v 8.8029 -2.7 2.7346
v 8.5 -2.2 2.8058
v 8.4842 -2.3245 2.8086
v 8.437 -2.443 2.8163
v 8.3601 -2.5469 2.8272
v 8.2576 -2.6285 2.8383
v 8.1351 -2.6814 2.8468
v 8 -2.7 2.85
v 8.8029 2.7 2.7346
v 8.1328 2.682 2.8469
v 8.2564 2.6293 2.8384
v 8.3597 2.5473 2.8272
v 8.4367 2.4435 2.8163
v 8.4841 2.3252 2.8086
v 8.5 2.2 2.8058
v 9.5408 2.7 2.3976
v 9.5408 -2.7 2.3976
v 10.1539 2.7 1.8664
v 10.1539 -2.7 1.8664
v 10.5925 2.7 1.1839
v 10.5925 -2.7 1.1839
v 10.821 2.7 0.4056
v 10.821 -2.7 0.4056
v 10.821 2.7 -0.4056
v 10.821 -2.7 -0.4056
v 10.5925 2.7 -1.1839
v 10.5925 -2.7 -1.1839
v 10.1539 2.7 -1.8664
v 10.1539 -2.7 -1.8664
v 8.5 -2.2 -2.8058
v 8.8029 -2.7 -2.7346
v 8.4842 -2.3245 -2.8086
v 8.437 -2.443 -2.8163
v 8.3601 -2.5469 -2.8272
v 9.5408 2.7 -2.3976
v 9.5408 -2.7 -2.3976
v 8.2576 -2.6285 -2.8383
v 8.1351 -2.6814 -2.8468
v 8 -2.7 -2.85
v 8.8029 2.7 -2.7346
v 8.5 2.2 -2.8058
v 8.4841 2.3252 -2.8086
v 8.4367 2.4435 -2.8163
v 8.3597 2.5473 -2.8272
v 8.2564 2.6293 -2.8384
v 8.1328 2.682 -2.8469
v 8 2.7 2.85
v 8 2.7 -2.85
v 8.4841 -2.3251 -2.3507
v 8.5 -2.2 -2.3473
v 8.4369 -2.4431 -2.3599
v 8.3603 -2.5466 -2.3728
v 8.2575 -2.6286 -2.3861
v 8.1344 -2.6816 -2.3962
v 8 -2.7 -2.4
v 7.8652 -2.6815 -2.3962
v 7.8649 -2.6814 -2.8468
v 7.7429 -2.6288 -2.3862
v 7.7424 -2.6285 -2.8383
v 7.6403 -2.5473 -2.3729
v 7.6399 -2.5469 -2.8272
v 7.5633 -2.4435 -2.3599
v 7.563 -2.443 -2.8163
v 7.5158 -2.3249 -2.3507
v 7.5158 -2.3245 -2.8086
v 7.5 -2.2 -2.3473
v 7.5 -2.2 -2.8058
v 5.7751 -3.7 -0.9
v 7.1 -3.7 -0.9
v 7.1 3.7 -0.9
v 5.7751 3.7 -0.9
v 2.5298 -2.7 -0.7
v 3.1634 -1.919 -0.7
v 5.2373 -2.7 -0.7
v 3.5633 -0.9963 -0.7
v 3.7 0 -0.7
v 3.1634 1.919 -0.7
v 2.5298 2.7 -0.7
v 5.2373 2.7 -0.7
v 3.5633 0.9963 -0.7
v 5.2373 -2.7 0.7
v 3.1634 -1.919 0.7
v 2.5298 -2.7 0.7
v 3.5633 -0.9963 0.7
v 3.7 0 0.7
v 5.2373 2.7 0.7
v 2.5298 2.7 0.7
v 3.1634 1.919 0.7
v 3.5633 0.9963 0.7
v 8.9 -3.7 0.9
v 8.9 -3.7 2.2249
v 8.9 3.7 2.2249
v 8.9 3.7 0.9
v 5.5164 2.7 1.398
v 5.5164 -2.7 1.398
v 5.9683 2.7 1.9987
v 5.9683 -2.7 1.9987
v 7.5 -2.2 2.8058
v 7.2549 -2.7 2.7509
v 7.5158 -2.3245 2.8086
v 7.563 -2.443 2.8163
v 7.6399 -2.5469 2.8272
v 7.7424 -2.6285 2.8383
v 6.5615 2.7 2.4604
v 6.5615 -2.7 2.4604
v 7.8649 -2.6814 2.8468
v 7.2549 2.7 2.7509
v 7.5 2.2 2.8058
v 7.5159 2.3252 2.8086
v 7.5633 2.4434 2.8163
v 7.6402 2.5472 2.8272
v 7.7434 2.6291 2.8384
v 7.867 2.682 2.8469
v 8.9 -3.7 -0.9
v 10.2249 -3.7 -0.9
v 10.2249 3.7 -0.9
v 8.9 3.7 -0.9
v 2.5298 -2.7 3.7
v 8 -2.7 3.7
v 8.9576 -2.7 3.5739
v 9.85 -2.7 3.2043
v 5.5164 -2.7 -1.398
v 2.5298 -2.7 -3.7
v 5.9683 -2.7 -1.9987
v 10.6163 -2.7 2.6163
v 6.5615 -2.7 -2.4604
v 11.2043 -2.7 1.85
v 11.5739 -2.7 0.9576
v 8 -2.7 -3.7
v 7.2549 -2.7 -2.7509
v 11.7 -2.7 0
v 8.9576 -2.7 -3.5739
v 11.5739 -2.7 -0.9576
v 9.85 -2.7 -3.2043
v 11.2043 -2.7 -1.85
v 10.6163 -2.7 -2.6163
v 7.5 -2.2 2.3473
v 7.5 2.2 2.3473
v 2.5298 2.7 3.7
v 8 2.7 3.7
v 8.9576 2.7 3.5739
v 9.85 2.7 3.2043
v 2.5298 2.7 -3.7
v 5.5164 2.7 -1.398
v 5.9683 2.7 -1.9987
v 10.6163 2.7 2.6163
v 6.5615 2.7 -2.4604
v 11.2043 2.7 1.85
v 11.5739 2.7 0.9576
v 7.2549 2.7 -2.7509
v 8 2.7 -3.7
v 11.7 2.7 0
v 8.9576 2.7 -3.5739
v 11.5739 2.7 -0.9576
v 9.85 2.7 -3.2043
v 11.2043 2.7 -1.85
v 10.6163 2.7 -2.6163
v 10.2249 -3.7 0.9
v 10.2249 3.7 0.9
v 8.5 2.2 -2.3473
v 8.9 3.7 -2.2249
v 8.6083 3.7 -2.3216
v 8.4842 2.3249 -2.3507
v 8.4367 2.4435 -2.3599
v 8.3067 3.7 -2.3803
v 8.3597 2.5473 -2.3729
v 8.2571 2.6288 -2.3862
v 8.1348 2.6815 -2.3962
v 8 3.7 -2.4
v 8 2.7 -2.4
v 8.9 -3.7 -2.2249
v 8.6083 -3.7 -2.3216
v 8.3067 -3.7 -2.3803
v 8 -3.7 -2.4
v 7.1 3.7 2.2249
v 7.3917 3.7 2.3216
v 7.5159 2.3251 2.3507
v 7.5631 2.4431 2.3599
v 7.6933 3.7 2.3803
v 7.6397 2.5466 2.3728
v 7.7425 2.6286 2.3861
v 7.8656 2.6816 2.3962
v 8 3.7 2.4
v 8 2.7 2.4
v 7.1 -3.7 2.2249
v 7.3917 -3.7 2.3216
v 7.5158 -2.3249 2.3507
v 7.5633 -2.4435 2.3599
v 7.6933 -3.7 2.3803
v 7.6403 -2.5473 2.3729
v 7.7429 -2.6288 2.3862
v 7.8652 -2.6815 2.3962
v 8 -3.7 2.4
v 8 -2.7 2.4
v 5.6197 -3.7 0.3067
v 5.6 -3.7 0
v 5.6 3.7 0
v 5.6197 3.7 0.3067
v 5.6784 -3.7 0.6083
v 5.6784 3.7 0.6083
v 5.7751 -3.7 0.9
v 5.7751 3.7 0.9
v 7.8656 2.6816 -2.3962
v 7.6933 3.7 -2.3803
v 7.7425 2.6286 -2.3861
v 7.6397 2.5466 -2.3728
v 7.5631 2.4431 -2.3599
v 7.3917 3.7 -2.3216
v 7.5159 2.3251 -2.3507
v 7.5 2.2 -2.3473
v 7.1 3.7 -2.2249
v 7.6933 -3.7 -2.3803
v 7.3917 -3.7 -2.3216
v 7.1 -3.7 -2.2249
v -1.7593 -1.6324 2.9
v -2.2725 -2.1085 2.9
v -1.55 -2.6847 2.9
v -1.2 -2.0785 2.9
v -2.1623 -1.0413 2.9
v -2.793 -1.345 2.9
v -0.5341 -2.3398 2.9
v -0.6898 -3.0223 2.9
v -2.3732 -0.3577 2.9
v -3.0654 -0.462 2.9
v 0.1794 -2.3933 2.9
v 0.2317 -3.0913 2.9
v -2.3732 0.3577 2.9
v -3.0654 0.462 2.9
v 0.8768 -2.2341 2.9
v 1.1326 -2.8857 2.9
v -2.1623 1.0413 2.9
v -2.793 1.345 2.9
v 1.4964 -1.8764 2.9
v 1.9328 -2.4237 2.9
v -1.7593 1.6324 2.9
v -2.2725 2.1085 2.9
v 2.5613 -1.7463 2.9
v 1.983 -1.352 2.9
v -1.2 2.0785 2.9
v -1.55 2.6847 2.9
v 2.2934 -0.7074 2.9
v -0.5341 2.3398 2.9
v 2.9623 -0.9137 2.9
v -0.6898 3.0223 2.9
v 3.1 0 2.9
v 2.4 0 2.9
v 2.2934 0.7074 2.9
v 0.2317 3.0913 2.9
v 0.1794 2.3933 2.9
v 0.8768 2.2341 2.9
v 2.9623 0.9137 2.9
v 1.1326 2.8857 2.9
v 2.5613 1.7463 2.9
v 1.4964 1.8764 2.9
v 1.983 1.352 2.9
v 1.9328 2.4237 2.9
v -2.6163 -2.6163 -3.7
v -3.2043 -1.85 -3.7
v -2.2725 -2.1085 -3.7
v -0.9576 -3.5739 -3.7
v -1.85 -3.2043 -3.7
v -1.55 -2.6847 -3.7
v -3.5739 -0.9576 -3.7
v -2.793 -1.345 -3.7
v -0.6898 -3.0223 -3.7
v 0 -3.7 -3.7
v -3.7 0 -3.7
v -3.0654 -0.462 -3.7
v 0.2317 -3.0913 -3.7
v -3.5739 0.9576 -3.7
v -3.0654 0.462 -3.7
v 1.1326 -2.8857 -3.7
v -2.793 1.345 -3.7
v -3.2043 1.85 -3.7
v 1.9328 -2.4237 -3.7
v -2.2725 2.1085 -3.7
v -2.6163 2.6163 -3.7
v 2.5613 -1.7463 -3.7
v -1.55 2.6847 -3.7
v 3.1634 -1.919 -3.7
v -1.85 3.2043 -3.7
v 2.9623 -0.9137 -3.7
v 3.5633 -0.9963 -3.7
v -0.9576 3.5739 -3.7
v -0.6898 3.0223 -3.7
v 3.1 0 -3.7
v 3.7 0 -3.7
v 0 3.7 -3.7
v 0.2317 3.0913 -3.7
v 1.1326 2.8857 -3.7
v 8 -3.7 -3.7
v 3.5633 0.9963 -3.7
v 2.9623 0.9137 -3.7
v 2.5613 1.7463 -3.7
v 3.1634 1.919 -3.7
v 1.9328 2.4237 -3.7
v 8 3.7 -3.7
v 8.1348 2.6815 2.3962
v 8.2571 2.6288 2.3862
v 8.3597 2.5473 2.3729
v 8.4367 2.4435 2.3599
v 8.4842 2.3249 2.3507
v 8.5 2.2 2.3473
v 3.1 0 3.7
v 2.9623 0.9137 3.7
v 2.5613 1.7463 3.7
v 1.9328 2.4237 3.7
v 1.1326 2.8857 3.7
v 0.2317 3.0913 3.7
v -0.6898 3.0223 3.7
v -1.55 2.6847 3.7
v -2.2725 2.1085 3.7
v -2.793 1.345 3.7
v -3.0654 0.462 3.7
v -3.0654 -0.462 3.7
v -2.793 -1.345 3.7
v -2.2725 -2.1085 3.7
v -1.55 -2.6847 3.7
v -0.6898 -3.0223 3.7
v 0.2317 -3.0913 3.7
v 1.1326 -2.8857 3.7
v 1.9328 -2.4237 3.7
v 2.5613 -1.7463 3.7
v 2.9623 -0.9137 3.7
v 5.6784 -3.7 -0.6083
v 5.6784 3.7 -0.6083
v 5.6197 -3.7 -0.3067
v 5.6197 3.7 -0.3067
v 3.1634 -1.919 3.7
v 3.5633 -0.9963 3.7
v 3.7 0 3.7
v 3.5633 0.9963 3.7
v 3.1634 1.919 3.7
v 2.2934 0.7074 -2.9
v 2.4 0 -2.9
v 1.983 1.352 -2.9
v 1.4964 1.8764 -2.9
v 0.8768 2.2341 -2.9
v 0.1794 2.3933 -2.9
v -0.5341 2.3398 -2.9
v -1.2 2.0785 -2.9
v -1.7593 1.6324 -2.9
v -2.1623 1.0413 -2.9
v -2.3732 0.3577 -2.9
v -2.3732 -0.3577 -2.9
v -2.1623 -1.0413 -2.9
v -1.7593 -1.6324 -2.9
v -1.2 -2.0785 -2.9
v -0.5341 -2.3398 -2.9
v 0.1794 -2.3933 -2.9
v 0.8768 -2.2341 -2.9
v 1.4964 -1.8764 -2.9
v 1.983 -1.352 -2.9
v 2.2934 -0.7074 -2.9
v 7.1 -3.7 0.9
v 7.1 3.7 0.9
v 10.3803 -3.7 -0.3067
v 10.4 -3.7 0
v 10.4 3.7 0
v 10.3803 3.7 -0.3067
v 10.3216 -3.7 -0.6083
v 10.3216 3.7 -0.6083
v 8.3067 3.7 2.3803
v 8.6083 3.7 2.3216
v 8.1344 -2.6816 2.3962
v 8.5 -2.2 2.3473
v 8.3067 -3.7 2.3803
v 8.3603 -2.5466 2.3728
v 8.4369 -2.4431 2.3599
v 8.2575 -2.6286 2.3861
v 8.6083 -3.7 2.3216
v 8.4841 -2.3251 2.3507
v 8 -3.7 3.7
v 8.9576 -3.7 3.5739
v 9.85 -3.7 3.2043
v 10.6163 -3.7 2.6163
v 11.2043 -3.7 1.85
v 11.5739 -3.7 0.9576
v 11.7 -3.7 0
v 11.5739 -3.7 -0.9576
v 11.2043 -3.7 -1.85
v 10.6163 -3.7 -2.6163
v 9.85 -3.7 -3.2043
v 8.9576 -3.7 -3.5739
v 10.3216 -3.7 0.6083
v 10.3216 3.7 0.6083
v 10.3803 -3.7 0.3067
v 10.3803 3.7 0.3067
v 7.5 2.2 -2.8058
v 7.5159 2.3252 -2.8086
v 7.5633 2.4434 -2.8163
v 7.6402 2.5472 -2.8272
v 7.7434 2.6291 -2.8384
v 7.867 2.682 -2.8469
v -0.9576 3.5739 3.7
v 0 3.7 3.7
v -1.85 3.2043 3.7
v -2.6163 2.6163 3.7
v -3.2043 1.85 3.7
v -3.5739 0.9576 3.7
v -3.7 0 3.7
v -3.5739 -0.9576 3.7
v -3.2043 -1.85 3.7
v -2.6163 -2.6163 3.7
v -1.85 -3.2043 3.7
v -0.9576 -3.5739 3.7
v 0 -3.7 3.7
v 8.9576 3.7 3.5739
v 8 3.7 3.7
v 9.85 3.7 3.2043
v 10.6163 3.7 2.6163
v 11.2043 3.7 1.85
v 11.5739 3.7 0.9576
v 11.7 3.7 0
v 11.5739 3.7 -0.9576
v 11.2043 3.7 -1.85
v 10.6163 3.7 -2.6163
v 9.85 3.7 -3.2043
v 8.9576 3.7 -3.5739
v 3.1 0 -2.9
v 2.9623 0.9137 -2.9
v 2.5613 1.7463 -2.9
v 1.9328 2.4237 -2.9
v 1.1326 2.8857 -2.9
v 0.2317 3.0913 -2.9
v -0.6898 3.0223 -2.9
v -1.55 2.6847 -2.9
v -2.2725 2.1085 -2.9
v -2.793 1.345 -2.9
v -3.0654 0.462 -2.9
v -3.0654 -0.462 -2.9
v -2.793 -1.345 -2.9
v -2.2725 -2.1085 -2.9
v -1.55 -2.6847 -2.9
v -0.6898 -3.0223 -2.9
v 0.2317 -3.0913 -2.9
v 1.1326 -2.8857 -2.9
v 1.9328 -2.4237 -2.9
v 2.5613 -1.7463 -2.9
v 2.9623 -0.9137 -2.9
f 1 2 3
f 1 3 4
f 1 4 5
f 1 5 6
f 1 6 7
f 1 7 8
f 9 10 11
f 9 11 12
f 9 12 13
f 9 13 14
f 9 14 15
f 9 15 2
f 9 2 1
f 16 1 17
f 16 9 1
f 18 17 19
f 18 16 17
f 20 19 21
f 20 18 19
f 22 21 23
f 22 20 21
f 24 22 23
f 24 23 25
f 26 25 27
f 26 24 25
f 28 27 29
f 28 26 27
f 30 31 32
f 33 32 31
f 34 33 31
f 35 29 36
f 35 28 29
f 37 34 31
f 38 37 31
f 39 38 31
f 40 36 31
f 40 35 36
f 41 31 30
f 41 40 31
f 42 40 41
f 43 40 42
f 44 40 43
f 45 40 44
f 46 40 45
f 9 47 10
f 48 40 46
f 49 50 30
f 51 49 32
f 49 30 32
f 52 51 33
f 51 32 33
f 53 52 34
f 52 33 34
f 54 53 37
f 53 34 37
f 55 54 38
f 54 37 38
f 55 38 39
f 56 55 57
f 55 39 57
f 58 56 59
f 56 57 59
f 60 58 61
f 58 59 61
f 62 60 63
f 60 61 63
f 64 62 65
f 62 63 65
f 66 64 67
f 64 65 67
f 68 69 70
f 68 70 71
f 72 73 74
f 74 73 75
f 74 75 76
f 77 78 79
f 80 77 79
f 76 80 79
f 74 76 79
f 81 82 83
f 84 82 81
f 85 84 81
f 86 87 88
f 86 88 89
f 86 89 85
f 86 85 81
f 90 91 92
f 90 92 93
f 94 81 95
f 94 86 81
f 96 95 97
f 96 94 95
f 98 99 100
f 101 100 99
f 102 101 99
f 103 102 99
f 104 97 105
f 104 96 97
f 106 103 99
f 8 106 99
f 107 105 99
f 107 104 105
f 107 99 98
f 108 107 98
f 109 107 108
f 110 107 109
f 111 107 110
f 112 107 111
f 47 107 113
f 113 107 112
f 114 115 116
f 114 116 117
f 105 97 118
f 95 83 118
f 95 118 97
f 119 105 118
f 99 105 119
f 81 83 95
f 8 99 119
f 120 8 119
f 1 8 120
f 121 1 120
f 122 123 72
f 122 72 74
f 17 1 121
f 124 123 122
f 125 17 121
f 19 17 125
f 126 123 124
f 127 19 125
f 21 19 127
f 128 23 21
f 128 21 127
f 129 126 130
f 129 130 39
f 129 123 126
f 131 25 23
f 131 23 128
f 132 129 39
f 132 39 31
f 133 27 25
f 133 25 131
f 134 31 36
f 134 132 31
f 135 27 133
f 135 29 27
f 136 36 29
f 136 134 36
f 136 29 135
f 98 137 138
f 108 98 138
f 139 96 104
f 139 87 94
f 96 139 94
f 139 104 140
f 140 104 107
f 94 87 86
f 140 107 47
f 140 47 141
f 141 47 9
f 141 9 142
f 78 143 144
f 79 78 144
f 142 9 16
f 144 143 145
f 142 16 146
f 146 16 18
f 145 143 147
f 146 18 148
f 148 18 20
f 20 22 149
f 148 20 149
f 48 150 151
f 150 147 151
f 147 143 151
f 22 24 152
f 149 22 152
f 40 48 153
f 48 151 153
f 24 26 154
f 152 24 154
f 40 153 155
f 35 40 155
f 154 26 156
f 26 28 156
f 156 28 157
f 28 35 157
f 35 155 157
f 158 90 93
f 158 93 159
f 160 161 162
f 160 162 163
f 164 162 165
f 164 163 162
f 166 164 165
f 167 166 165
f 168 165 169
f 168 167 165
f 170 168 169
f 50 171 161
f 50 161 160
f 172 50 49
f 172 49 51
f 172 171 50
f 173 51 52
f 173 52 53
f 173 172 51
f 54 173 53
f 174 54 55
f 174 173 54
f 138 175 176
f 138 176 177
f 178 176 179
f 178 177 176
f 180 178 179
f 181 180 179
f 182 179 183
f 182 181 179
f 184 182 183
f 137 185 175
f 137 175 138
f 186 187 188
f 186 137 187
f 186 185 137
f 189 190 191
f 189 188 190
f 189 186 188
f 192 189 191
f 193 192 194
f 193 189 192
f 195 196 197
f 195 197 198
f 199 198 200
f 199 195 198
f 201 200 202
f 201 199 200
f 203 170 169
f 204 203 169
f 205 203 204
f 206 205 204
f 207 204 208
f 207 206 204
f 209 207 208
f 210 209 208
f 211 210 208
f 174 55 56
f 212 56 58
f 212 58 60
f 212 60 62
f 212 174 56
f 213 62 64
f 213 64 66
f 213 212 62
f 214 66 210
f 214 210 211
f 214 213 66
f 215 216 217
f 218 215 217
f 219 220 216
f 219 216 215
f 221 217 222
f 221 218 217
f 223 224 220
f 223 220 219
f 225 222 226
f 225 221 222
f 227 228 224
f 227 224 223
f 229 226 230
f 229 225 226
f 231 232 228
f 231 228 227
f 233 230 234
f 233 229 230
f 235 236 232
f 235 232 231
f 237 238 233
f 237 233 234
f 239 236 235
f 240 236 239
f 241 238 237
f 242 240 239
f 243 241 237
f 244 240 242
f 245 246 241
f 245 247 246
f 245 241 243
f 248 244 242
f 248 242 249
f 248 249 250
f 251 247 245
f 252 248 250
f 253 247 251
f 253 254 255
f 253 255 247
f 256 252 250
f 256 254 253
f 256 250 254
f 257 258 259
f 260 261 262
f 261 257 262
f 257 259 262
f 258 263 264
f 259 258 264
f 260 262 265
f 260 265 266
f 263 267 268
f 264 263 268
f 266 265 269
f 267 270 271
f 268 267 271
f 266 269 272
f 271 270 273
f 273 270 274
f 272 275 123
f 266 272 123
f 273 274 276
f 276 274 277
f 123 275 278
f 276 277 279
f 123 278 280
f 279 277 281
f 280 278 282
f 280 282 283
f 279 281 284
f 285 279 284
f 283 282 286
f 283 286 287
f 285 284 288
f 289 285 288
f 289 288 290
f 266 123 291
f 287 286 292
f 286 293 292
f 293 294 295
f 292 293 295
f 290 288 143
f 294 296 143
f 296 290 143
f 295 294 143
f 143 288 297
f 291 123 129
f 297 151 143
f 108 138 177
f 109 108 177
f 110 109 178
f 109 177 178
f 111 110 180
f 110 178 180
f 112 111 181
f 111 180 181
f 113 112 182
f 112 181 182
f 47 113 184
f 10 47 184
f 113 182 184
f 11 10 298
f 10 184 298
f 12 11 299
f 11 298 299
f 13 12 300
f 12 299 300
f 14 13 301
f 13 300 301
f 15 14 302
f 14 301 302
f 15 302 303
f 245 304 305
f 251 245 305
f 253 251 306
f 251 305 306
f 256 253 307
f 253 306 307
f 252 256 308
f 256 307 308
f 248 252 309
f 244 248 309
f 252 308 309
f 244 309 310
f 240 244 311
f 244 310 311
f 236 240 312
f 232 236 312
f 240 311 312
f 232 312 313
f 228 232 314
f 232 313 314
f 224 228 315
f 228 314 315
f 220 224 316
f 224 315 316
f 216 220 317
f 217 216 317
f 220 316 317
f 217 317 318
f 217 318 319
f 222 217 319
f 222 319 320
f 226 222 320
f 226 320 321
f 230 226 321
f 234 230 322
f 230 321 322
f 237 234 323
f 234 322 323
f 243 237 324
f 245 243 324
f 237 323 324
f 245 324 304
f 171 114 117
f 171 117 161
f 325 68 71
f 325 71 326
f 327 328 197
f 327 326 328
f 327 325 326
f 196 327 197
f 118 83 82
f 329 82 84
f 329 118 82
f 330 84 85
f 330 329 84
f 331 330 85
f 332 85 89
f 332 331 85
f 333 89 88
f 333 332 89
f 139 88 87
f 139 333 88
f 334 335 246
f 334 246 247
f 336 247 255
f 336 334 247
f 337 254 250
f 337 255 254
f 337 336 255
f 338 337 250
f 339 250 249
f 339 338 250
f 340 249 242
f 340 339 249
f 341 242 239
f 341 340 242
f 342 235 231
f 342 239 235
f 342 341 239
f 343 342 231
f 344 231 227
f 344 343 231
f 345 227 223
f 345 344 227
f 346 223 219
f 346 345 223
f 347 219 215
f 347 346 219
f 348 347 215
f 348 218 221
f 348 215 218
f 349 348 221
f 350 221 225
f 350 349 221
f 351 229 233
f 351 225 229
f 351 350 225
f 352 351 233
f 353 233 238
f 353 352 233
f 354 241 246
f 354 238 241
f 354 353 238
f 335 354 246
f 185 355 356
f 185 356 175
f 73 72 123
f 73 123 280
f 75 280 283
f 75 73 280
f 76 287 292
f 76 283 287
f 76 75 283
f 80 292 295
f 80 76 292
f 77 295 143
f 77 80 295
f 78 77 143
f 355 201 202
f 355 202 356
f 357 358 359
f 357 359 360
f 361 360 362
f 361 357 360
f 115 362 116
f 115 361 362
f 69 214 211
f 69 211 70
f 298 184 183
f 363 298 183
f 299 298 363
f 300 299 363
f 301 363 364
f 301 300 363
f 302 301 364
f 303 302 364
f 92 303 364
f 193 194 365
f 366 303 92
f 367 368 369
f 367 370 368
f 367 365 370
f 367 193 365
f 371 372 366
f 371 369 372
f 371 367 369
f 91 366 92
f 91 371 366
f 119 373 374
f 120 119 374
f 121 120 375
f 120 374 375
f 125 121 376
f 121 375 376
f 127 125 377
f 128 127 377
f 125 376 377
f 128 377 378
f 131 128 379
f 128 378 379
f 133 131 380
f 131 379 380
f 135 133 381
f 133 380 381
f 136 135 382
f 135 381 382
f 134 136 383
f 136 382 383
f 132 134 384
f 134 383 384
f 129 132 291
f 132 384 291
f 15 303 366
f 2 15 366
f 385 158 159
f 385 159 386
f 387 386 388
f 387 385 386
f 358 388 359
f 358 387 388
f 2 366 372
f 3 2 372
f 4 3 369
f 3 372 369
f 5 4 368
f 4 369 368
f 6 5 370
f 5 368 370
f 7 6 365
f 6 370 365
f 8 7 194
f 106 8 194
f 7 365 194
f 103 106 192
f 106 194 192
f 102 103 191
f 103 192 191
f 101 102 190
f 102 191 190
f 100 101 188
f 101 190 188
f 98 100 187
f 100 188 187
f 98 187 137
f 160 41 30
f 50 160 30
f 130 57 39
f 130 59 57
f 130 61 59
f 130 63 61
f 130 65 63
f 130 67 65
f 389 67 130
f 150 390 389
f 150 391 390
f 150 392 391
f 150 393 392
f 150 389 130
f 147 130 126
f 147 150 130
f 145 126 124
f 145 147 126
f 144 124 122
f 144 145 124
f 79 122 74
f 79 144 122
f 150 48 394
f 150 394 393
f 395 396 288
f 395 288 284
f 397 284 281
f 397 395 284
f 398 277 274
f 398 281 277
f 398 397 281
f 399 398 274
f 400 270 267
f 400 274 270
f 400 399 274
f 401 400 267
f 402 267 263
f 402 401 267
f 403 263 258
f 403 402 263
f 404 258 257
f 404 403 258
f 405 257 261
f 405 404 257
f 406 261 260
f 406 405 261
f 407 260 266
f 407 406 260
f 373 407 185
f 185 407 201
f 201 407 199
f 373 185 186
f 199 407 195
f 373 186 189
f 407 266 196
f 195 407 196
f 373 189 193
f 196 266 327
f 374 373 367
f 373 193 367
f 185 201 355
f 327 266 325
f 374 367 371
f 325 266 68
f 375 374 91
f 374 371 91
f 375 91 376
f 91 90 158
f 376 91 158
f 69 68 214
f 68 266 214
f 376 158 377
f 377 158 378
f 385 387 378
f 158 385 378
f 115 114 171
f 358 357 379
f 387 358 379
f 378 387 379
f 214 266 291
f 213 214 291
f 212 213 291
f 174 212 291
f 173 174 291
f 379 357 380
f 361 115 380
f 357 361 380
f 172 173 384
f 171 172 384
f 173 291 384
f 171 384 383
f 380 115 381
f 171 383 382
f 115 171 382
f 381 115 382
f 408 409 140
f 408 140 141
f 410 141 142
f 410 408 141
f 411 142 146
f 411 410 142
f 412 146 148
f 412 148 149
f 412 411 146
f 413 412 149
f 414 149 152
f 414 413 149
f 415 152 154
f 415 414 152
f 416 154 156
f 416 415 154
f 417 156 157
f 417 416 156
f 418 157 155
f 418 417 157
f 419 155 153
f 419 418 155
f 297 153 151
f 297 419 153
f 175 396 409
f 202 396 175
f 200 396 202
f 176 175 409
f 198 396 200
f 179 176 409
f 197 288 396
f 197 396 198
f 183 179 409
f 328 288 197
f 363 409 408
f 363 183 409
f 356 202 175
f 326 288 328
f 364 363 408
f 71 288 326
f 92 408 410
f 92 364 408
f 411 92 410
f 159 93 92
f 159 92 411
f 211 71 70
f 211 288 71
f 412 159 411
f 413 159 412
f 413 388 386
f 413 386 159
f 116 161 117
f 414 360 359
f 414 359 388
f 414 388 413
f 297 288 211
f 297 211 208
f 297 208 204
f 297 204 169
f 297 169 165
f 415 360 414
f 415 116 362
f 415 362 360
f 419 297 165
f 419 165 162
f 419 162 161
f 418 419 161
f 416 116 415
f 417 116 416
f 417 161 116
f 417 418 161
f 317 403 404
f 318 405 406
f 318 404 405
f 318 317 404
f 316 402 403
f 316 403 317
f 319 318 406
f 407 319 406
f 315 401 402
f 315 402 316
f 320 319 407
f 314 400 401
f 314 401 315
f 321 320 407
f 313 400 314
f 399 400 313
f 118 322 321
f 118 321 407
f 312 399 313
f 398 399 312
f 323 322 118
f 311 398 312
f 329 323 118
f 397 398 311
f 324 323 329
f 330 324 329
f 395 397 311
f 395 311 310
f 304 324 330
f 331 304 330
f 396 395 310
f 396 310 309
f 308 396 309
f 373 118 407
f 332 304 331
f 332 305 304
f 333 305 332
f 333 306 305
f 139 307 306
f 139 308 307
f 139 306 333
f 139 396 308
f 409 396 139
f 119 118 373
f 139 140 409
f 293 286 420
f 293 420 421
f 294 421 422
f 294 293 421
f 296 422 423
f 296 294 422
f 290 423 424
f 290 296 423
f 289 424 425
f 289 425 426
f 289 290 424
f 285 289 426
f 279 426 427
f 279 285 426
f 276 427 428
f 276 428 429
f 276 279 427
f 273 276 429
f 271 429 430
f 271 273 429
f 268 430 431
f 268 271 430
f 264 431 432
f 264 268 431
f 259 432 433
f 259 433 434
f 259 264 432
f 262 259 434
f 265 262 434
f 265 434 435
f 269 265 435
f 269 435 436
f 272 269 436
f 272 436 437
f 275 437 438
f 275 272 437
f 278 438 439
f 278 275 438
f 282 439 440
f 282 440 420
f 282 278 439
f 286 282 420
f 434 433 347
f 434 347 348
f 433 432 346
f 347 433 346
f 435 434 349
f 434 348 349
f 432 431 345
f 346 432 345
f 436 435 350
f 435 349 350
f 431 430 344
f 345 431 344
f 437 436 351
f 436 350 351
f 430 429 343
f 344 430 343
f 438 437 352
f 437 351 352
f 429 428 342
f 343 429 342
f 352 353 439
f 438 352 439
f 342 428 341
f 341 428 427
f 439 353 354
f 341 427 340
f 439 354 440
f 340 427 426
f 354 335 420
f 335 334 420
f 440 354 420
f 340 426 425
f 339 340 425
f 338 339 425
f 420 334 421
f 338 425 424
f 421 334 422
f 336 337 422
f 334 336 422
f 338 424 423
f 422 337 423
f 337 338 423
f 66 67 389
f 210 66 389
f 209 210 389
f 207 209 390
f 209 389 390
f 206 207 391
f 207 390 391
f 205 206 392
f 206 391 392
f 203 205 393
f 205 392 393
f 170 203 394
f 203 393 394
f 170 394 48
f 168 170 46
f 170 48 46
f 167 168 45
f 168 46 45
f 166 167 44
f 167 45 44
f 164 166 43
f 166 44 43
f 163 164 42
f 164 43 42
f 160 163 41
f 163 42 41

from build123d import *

# Parameters (mm, degrees)
SKETCH1_R            = 3.7
SKETCH1_R_2          = 2.4
PIN_SIDE_DEPTH       = 3.7
SIDE_START           = 3.7
SIDE_EAR_DEPTH       = 1
MIDDLE_RIB_DEPTH     = 0.7
SKETCH4_R            = 2.85
AXLE_BODY_DEPTH      = 3.7
AXLE_CUT_DEPTH       = 13.816785869
AXLE_CUT_DEPTH_BACK  = 13.816785869
SKETCH5_W            = 1.8
SKETCH5_H            = 1.8
AXLE_SLOT_DEPTH      = 13.816785869
AXLE_SLOT_DEPTH_BACK = 13.816785869
SKETCH7_R            = 3.1
PIN_RIM_DEPTH        = 0.8


with BuildPart() as part:
    # Sketch1 → Pin Side (new, symmetric)
    with BuildSketch(Plane.XY):
        Circle(SKETCH1_R)
        Circle(SKETCH1_R_2, mode=Mode.SUBTRACT)
    extrude(amount=PIN_SIDE_DEPTH, both=True)

    # Sketch2 → Side Ear (add)
    with BuildSketch(Plane(origin=(0, 0, 0), x_dir=(1, 0, 0), z_dir=(0, 1, 0)).offset(SIDE_START)):
        with BuildLine():
            Line((0, 3.7), (0, -3.7))
            Line((0, -3.7), (8, -3.7))
            ThreePointArc((8, -3.7), (11.7, 0), (8, 3.7))
            Line((8, 3.7), (0, 3.7))
        make_face()
    side_ear = extrude(amount=-SIDE_EAR_DEPTH)

    # Mirror1: Side Ear across plane
    add(side_ear.mirror(Plane.ZX))

    # Sketch3 → Middle Rib (add, symmetric)
    with BuildSketch(Plane.XY):
        with BuildLine():
            Line((2.529822128, -2.7), (8, -2.7))
            Line((8, -2.7), (8, 2.7))
            Line((8, 2.7), (2.529822128, 2.7))
            ThreePointArc((2.529822128, 2.7), (3.7, 0), (2.529822128, -2.7))
        make_face()
    extrude(amount=MIDDLE_RIB_DEPTH, both=True)

    # Sketch4 → Axle Body (add, symmetric)
    with BuildSketch(Plane(origin=(0, 0, 0), x_dir=(1, 0, 0), z_dir=(0, 1, 0))):
        with Locations((8, 0)):
            Circle(SKETCH4_R)
    extrude(amount=AXLE_BODY_DEPTH, both=True)

    # Sketch5 → Axle Cut (cut, two sides: drawn at the far end of the back side and taken through both)
    with BuildSketch(Plane(origin=(0, 0, 0), x_dir=(1, 0, 0), z_dir=(0, 1, 0)).offset(-AXLE_CUT_DEPTH_BACK)):
        with BuildLine():
            Line((5.775140454, -0.9), (7.1, -0.9))
            Line((7.1, -0.9), (7.1, 0.9))
            Line((7.1, 0.9), (5.775140454, 0.9))
            ThreePointArc((5.775140454, 0.9), (5.644191972, 0.458441422), (5.6, -1.6e-08))
            ThreePointArc((5.6, -1.6e-08), (5.644191976, -0.458441438), (5.775140454, -0.9))
        make_face()
        with BuildLine():
            Line((7.1, 0.9), (8.9, 0.9))
            Line((8.9, 0.9), (8.9, 2.224859546))
            ThreePointArc((8.9, 2.224859546), (8.45844143, 2.355808026), (8, 2.4))
            ThreePointArc((8, 2.4), (7.54155857, 2.355808026), (7.1, 2.224859546))
            Line((7.1, 2.224859546), (7.1, 0.9))
        make_face()
        with Locations((8, 0)):
            Rectangle(SKETCH5_W, SKETCH5_H)
        with BuildLine():
            Line((8.9, 0.9), (8.9, -0.9))
            Line((8.9, -0.9), (10.224859546, -0.9))
            ThreePointArc((10.224859546, -0.9), (10.355808026, -0.45844143), (10.4, 0))
            ThreePointArc((10.4, 0), (10.355808026, 0.45844143), (10.224859546, 0.9))
            Line((10.224859546, 0.9), (8.9, 0.9))
        make_face()
        with BuildLine():
            ThreePointArc((7.1, -2.224859546), (7.54155857, -2.355808026), (8, -2.4))
            ThreePointArc((8, -2.4), (8.45844143, -2.355808026), (8.9, -2.224859546))
            Line((8.9, -2.224859546), (8.9, -0.9))
            Line((8.9, -0.9), (7.1, -0.9))
            Line((7.1, -0.9), (7.1, -2.224859546))
        make_face()
    extrude(amount=AXLE_CUT_DEPTH + AXLE_CUT_DEPTH_BACK, mode=Mode.SUBTRACT)

    # Sketch6 → Axle Slot (cut, two sides: drawn at the far end of the back side and taken through both)
    with BuildSketch(Plane.XY.offset(-AXLE_SLOT_DEPTH_BACK)):
        with BuildLine():
            Line((7.5, -2.2), (7.5, 2.2))
            ThreePointArc((7.5, 2.2), (8, 2.7), (8.5, 2.2))
            Line((8.5, 2.2), (8.5, -2.2))
            ThreePointArc((8.5, -2.2), (8, -2.7), (7.5, -2.2))
        make_face()
    extrude(amount=AXLE_SLOT_DEPTH + AXLE_SLOT_DEPTH_BACK, mode=Mode.SUBTRACT)

    # Sketch7 → Pin Rim (cut)
    with BuildSketch(Plane.XY.offset(3.7)):
        Circle(SKETCH7_R)
    pin_rim = extrude(amount=-PIN_RIM_DEPTH, mode=Mode.SUBTRACT)

    # Mirror2: Pin Rim across plane
    add(pin_rim.mirror(Plane.XY), mode=Mode.SUBTRACT)


solid = part.part
